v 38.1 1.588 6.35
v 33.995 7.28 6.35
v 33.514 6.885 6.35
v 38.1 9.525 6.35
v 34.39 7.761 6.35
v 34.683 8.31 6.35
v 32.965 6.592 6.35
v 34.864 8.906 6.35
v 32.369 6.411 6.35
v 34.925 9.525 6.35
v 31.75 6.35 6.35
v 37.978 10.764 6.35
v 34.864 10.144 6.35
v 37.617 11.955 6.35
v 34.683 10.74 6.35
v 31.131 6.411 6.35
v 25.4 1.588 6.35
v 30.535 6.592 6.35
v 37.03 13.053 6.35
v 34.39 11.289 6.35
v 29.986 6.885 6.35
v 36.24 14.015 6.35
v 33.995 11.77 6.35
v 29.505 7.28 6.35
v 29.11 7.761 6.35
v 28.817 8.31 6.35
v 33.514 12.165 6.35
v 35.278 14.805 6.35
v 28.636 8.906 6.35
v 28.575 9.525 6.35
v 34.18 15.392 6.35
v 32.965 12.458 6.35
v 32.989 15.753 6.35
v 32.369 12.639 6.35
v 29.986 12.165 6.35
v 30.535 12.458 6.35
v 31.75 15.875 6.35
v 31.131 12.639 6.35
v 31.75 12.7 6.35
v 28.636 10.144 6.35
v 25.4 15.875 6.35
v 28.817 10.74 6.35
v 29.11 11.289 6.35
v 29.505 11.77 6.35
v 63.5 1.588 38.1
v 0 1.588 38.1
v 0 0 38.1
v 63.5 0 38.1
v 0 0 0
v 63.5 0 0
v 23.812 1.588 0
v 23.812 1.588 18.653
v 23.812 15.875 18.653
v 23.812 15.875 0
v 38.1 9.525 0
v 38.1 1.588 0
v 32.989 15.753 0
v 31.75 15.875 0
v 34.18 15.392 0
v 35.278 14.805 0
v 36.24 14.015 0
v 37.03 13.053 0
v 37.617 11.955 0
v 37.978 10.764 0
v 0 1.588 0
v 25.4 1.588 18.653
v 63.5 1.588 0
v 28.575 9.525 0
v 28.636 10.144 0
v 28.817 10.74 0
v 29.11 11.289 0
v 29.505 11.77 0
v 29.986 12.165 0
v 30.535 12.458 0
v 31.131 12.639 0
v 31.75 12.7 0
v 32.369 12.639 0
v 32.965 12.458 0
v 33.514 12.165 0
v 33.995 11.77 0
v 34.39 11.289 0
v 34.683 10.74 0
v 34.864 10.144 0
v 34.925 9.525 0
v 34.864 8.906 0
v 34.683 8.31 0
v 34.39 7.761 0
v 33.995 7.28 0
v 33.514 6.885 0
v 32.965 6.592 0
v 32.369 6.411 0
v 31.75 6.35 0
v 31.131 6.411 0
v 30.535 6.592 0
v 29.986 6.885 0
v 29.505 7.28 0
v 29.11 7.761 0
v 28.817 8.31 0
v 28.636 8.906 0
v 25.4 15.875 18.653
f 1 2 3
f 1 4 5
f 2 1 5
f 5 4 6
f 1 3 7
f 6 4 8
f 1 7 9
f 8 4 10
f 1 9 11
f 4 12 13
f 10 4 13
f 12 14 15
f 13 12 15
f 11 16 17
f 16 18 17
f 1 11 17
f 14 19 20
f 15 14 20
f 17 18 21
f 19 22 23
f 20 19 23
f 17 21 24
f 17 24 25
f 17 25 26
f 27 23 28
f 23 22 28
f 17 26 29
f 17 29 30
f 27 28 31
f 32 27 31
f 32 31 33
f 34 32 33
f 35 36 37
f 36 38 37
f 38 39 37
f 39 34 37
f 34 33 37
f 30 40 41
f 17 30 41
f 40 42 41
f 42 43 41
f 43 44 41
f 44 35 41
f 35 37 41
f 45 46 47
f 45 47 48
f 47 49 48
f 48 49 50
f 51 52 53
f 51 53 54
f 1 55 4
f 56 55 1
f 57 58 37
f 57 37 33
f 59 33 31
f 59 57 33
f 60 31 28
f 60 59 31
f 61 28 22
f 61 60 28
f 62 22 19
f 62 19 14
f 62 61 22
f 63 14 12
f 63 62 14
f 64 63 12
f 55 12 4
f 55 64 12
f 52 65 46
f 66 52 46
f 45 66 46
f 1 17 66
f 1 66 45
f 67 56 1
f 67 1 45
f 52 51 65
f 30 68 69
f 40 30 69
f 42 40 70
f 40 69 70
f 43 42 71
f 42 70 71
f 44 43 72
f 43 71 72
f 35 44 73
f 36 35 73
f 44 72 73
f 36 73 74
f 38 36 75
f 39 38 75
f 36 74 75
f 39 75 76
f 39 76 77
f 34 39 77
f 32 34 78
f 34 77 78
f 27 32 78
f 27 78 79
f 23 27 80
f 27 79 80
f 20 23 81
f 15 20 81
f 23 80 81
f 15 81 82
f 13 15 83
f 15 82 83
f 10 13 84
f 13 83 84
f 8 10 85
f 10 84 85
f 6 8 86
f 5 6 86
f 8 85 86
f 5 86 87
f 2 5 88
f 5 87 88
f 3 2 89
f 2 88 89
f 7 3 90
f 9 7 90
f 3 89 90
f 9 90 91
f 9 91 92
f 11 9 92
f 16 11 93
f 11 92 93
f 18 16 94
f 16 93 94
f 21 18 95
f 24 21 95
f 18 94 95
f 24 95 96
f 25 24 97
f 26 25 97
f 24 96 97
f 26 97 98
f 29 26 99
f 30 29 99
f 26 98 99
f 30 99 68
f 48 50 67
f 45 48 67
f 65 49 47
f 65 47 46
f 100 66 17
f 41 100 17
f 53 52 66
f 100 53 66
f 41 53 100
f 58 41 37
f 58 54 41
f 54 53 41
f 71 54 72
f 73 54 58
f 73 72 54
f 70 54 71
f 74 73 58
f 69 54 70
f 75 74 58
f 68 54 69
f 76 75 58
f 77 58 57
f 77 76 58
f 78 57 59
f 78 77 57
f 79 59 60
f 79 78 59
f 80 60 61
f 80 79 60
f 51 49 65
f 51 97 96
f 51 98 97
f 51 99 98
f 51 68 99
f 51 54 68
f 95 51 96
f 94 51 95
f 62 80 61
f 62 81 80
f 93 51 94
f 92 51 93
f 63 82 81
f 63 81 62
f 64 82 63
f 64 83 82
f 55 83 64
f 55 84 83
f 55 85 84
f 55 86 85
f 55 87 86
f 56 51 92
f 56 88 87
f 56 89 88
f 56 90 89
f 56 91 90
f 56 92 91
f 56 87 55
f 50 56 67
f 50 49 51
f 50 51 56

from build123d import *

# Parameters (mm, degrees)
SKETCH1_W           = 63.5
SKETCH1_H           = 1.5875
BOSS_EXTRUDE1_DEPTH = 38.1
SKETCH2_R           = 3.175
BOSS_EXTRUDE2_DEPTH = 6.35
SKETCH3_W           = 1.5875
SKETCH3_H           = 18.653125
BOSS_EXTRUDE3_DEPTH = 14.2875


with BuildPart() as part:
    # Sketch1 → Boss-Extrude1 (new body)
    with BuildSketch(Plane.XY):
        with Locations((31.75, 0.79375)):
            Rectangle(SKETCH1_W, SKETCH1_H)
    extrude(amount=BOSS_EXTRUDE1_DEPTH)

    # Sketch2 → Boss-Extrude2 (add)
    with BuildSketch(Plane(origin=(0, 0, 0), x_dir=(-1, 0, 0), z_dir=(0, 0, -1))):
        with BuildLine():
            Line((-38.1, 9.525), (-38.1, 1.5875))
            Line((-38.1, 1.5875), (-25.4, 1.5875))
            Line((-25.4, 1.5875), (-25.4, 9.525))
            Line((-25.4, 9.525), (-25.4, 15.875))
            Line((-25.4, 15.875), (-31.75, 15.875))
            ThreePointArc((-31.75, 15.875), (-36.240128061, 14.015128061), (-38.1, 9.525))
        make_face()
        with Locations((-31.75, 9.525)):
            Circle(SKETCH2_R, mode=Mode.SUBTRACT)
    extrude(amount=-BOSS_EXTRUDE2_DEPTH)

    # Sketch3 → Boss-Extrude3 (add)
    with BuildSketch(Plane(origin=(0, 1.5875, 0), x_dir=(1, 0, 0), z_dir=(0, 1, 0))):
        with Locations((24.60625, -9.3265625)):
            Rectangle(SKETCH3_W, SKETCH3_H)
    extrude(amount=BOSS_EXTRUDE3_DEPTH)


solid = part.part
